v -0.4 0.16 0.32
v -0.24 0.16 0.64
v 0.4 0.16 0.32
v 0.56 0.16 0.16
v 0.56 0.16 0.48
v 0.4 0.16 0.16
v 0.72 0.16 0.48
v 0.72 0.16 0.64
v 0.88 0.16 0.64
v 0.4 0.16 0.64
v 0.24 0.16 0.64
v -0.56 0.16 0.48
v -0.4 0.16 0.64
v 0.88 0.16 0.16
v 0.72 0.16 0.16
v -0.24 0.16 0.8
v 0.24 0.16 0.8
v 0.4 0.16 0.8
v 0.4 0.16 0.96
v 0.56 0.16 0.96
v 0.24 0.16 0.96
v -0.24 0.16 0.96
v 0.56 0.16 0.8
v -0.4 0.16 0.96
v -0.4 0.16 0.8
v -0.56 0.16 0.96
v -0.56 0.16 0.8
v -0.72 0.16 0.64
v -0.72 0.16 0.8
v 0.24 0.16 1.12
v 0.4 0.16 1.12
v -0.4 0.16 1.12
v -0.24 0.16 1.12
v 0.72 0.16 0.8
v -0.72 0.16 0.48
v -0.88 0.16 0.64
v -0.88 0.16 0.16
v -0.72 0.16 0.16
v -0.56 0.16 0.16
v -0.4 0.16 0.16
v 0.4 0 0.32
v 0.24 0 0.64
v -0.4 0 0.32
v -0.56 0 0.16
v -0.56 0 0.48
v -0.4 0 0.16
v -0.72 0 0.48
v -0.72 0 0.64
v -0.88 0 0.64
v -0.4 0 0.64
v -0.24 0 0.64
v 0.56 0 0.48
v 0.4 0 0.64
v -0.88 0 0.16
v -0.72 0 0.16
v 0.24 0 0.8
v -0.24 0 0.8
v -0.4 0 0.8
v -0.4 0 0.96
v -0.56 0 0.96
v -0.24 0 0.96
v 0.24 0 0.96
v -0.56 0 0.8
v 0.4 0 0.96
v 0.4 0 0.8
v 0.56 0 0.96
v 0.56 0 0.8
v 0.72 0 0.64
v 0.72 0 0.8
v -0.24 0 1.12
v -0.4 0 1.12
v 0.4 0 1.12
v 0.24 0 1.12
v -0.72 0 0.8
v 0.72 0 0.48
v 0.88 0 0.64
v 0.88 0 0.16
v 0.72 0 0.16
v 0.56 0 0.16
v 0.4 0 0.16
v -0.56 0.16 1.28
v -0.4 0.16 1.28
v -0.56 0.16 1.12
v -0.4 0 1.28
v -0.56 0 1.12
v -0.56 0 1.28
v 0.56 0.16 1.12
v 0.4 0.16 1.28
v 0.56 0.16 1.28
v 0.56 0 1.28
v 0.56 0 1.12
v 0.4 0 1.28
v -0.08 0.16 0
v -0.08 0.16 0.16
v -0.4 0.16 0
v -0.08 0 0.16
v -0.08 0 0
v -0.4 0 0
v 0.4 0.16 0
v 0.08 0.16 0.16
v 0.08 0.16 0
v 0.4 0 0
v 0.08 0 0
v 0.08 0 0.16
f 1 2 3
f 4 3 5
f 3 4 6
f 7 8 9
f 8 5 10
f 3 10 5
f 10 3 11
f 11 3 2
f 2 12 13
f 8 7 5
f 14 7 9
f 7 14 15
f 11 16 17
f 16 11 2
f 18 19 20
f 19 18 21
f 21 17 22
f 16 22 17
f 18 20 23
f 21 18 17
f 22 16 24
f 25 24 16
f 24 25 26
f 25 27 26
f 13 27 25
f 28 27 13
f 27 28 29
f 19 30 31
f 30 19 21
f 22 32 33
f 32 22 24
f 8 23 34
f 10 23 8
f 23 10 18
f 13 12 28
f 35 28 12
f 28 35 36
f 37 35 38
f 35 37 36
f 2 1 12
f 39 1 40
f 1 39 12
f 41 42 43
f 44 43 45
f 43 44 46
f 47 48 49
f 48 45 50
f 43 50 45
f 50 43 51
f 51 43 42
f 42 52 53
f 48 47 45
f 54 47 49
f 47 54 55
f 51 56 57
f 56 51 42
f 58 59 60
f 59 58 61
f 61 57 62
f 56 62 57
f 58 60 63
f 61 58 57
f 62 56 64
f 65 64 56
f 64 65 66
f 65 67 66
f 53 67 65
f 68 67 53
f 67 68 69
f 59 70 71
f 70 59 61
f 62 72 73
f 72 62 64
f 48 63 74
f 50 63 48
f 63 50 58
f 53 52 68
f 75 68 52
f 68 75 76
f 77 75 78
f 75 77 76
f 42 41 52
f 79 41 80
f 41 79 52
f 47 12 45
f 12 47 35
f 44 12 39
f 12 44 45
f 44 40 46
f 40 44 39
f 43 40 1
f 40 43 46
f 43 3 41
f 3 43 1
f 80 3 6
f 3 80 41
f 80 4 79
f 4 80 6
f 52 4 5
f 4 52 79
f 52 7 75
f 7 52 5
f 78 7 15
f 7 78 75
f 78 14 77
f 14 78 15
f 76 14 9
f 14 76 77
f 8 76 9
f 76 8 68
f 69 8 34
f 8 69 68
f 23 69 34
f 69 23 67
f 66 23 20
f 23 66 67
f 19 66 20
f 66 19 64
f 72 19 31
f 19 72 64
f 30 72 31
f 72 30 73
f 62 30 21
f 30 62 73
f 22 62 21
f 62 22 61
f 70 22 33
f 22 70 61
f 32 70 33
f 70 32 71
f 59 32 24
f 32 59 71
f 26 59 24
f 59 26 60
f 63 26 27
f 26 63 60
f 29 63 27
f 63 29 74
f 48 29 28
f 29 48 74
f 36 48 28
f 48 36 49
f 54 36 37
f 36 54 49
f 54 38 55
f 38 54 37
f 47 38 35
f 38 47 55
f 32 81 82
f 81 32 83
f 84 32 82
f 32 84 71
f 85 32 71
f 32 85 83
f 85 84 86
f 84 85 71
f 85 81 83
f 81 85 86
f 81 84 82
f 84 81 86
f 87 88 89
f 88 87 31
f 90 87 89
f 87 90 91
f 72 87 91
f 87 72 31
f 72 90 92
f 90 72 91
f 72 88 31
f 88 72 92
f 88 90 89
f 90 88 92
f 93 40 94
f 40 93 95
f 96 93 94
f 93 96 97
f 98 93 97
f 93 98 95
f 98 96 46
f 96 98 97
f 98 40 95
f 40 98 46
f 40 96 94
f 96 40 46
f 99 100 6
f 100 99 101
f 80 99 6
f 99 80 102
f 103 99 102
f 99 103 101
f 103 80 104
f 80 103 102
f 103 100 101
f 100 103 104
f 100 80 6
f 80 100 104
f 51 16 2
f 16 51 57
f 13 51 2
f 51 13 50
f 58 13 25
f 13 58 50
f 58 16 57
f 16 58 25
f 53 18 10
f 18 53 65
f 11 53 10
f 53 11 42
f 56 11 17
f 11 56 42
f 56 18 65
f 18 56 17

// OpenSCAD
/**
 * @module Space Invaders
 * @author Roland Hieber <rohieb+openscad@rohieb.name>
 * @license CC-0 (Public Domain), see http://creativecommons.org/about/cc0
 * 
 * All modules consume one 3-dimensional child, which is fed as the
 * second parameter to minkowski(). This allows you to render contiguous
 * shapes while not losing the pixel-ish look.
 *
 * For example, try:
 * <code>
 * 	space_invader_1(height=.5) cylinder(r=0.15, h=0.2);
 * </code>
 */

module __block() {
	polygon([[0,0],[0,1],[1,1],[1,0]]);
}

/**
 *    █     █
 *  █  █   █  █
 *  █ ███████ █
 *  ███ ███ ███
 *  ███████████
 *   █████████
 *    █     █
 *   █       █
 */
module space_invader_1(height=1) {
	minkowski() {
		difference() {
			// body and arms
			union() {
				linear_extrude(height=height)
					polygon([[0,7],[1,7],[1,5],[1,5],[2,5],[2,6],[3,6],[3,7],[4,7],
						[4,6],[7,6],[7,7],[8,7],[8,6],[9,6],[9,5],[10,5],[10,7],
						[11,7],[11,3],[10,3],[10,2],[9,2],[9,1],[8,1],[8,2],[3,2],
						[3,1],[2,1],[2,2],[1,2],[1,3],[0,3]
					]);
				// horns
				linear_extrude(height=height)
					translate([2,7]) __block();
				linear_extrude(height=height)
					translate([8,7]) __block();
				// feet
				linear_extrude(height=height)
					translate([1,0]) __block();
				linear_extrude(height=height)
					translate([9,0]) __block();
			}

			// eyes
			translate([0,0,-.5])
				linear_extrude(height=height+1)
				translate([3,4]) __block();
			translate([0,0,-.5])
				linear_extrude(height=height+1)
				translate([7,4]) __block();
		}
		children();
	}
}

/**
 *   █     █
 *    █   █
 *   ███████
 *  ██ ███ ██
 * ███████████
 * █ ███████ █
 * █ █     █ █
 *    ██ ██
 */
module space_invader_2(height=1) {
	minkowski() {
		difference() {
			// body
			union() {
				linear_extrude(height=height)
					polygon([[0,1],[0,4],[1,4],[1,5],[2,5],[2,6],[3,6],[3,7],[4,7],
						[4,6],[7,6],[7,7],[8,7],[8,6],[9,6],[9,5],[10,5],[10,4],
						[11,4],[11,1],[10,1],[10,3],[9,3],[9,1],[8,1],[8,2],[3,2],
						[3,1],[2,1],[2,3],[1,3],[1,1],[0,1]
					]);
				// horns
				linear_extrude(height=height)
					translate([2,7]) __block();
				linear_extrude(height=height)
					translate([8,7]) __block();
				// arms
				linear_extrude(height=height)
					polygon([[3,1],[5,1],[5,0],[3,0]]);
				linear_extrude(height=height)
					polygon([[6,1],[8,1],[8,0],[6,0]]);
			}
			// eyes
			translate([0,0,-.5])
				linear_extrude(height=height+1)
				translate([3,4]) __block();
			translate([0,0,-.5])
				linear_extrude(height=height+1)
				translate([7,4]) __block();
		}
		children();
	}
}

/**
 *    ██
 *   ████
 *  ██████
 * ██ ██ ██
 * ████████
 *   █  █
 *  █ ██ █
 * █ █  █ █
 */
module space_invader_3(height=1) {
	minkowski() {
		difference() {
			union() {
				// body
				linear_extrude(height=height)
					polygon([[0,3],[0,5],[1,5],[1,6],[2,6],[2,7],[3,7],[3,8],
						[5,8],[5,7],[6,7],[6,6],[7,6],[7,5],[8,5],[8,3]
					]);
				// tentacles
				linear_extrude(height=height)
					translate([0,0]) __block();
				linear_extrude(height=height)
					translate([2,0]) __block();
				linear_extrude(height=height)
					translate([5,0]) __block();
				linear_extrude(height=height)
					translate([7,0]) __block();
				linear_extrude(height=height)
					translate([1,1]) __block();
				linear_extrude(height=height)
					polygon([[3,1],[5,1],[5,2],[3,2]]);
				linear_extrude(height=height)
					translate([6,1]) __block();
				linear_extrude(height=height)
					translate([2,2]) __block();
				linear_extrude(height=height)
					translate([5,2]) __block();
			}
			// eyes
			translate([0,0,-.5])
				linear_extrude(height=height+1)
				translate([2,4]) __block();
			translate([0,0,-.5])
				linear_extrude(height=height+1)
				translate([5,4]) __block();
		}
		children();
	}
}

/**
 *    ██
 *   ████
 *  ██████
 * ██ ██ ██
 * ████████
 *  █ ██ █
 * █      █
 *  █    █
 */
module space_invader_4(height=1) {
	minkowski() {
		difference() {
			union() {
				// body
				linear_extrude(height=height)
					polygon([[0,3],[0,5],[1,5],[1,6],[2,6],[2,7],[3,7],[3,8],[5,8],
						[5,7],[6,7],[6,6],[7,6],[7,5],[8,5],[8,3],[7,3],[7,2],[6,2],
						[6,3],[5,3],[5,2],[3,2],[3,3],[2,3],[2,2],[1,2],[1,3]
					]);
				// feet
				linear_extrude(height=height)
					translate([0,1]) __block();
				linear_extrude(height=height)
					translate([1,0]) __block();
				linear_extrude(height=height)
					translate([7,1]) __block();
				linear_extrude(height=height)
					translate([6,0]) __block();
			}
			// eyes
			translate([0,0,-.5])
				linear_extrude(height=height+1)
				translate([2,4]) __block();
			translate([0,0,-.5])
				linear_extrude(height=height+1)
				translate([5,4]) __block();
		}
		children();
	}
}

// Here be dragons^WSpace Invaders. (Example code following)
invader=2;

scale(0.16)
translate([0,1,0])
rotate([90,0,0]) {
    if (invader==1) {
        translate([-5.5,0,0])
        space_invader_1();
    }
    if (invader==2) {
        translate([-5.5,0,0])
        space_invader_2();
    }
    if (invader==3) {
        translate([-4,0,0])
        space_invader_3();
    }
    if (invader==4) {
        translate([-4,0,0])
        space_invader_4();
    }
}
